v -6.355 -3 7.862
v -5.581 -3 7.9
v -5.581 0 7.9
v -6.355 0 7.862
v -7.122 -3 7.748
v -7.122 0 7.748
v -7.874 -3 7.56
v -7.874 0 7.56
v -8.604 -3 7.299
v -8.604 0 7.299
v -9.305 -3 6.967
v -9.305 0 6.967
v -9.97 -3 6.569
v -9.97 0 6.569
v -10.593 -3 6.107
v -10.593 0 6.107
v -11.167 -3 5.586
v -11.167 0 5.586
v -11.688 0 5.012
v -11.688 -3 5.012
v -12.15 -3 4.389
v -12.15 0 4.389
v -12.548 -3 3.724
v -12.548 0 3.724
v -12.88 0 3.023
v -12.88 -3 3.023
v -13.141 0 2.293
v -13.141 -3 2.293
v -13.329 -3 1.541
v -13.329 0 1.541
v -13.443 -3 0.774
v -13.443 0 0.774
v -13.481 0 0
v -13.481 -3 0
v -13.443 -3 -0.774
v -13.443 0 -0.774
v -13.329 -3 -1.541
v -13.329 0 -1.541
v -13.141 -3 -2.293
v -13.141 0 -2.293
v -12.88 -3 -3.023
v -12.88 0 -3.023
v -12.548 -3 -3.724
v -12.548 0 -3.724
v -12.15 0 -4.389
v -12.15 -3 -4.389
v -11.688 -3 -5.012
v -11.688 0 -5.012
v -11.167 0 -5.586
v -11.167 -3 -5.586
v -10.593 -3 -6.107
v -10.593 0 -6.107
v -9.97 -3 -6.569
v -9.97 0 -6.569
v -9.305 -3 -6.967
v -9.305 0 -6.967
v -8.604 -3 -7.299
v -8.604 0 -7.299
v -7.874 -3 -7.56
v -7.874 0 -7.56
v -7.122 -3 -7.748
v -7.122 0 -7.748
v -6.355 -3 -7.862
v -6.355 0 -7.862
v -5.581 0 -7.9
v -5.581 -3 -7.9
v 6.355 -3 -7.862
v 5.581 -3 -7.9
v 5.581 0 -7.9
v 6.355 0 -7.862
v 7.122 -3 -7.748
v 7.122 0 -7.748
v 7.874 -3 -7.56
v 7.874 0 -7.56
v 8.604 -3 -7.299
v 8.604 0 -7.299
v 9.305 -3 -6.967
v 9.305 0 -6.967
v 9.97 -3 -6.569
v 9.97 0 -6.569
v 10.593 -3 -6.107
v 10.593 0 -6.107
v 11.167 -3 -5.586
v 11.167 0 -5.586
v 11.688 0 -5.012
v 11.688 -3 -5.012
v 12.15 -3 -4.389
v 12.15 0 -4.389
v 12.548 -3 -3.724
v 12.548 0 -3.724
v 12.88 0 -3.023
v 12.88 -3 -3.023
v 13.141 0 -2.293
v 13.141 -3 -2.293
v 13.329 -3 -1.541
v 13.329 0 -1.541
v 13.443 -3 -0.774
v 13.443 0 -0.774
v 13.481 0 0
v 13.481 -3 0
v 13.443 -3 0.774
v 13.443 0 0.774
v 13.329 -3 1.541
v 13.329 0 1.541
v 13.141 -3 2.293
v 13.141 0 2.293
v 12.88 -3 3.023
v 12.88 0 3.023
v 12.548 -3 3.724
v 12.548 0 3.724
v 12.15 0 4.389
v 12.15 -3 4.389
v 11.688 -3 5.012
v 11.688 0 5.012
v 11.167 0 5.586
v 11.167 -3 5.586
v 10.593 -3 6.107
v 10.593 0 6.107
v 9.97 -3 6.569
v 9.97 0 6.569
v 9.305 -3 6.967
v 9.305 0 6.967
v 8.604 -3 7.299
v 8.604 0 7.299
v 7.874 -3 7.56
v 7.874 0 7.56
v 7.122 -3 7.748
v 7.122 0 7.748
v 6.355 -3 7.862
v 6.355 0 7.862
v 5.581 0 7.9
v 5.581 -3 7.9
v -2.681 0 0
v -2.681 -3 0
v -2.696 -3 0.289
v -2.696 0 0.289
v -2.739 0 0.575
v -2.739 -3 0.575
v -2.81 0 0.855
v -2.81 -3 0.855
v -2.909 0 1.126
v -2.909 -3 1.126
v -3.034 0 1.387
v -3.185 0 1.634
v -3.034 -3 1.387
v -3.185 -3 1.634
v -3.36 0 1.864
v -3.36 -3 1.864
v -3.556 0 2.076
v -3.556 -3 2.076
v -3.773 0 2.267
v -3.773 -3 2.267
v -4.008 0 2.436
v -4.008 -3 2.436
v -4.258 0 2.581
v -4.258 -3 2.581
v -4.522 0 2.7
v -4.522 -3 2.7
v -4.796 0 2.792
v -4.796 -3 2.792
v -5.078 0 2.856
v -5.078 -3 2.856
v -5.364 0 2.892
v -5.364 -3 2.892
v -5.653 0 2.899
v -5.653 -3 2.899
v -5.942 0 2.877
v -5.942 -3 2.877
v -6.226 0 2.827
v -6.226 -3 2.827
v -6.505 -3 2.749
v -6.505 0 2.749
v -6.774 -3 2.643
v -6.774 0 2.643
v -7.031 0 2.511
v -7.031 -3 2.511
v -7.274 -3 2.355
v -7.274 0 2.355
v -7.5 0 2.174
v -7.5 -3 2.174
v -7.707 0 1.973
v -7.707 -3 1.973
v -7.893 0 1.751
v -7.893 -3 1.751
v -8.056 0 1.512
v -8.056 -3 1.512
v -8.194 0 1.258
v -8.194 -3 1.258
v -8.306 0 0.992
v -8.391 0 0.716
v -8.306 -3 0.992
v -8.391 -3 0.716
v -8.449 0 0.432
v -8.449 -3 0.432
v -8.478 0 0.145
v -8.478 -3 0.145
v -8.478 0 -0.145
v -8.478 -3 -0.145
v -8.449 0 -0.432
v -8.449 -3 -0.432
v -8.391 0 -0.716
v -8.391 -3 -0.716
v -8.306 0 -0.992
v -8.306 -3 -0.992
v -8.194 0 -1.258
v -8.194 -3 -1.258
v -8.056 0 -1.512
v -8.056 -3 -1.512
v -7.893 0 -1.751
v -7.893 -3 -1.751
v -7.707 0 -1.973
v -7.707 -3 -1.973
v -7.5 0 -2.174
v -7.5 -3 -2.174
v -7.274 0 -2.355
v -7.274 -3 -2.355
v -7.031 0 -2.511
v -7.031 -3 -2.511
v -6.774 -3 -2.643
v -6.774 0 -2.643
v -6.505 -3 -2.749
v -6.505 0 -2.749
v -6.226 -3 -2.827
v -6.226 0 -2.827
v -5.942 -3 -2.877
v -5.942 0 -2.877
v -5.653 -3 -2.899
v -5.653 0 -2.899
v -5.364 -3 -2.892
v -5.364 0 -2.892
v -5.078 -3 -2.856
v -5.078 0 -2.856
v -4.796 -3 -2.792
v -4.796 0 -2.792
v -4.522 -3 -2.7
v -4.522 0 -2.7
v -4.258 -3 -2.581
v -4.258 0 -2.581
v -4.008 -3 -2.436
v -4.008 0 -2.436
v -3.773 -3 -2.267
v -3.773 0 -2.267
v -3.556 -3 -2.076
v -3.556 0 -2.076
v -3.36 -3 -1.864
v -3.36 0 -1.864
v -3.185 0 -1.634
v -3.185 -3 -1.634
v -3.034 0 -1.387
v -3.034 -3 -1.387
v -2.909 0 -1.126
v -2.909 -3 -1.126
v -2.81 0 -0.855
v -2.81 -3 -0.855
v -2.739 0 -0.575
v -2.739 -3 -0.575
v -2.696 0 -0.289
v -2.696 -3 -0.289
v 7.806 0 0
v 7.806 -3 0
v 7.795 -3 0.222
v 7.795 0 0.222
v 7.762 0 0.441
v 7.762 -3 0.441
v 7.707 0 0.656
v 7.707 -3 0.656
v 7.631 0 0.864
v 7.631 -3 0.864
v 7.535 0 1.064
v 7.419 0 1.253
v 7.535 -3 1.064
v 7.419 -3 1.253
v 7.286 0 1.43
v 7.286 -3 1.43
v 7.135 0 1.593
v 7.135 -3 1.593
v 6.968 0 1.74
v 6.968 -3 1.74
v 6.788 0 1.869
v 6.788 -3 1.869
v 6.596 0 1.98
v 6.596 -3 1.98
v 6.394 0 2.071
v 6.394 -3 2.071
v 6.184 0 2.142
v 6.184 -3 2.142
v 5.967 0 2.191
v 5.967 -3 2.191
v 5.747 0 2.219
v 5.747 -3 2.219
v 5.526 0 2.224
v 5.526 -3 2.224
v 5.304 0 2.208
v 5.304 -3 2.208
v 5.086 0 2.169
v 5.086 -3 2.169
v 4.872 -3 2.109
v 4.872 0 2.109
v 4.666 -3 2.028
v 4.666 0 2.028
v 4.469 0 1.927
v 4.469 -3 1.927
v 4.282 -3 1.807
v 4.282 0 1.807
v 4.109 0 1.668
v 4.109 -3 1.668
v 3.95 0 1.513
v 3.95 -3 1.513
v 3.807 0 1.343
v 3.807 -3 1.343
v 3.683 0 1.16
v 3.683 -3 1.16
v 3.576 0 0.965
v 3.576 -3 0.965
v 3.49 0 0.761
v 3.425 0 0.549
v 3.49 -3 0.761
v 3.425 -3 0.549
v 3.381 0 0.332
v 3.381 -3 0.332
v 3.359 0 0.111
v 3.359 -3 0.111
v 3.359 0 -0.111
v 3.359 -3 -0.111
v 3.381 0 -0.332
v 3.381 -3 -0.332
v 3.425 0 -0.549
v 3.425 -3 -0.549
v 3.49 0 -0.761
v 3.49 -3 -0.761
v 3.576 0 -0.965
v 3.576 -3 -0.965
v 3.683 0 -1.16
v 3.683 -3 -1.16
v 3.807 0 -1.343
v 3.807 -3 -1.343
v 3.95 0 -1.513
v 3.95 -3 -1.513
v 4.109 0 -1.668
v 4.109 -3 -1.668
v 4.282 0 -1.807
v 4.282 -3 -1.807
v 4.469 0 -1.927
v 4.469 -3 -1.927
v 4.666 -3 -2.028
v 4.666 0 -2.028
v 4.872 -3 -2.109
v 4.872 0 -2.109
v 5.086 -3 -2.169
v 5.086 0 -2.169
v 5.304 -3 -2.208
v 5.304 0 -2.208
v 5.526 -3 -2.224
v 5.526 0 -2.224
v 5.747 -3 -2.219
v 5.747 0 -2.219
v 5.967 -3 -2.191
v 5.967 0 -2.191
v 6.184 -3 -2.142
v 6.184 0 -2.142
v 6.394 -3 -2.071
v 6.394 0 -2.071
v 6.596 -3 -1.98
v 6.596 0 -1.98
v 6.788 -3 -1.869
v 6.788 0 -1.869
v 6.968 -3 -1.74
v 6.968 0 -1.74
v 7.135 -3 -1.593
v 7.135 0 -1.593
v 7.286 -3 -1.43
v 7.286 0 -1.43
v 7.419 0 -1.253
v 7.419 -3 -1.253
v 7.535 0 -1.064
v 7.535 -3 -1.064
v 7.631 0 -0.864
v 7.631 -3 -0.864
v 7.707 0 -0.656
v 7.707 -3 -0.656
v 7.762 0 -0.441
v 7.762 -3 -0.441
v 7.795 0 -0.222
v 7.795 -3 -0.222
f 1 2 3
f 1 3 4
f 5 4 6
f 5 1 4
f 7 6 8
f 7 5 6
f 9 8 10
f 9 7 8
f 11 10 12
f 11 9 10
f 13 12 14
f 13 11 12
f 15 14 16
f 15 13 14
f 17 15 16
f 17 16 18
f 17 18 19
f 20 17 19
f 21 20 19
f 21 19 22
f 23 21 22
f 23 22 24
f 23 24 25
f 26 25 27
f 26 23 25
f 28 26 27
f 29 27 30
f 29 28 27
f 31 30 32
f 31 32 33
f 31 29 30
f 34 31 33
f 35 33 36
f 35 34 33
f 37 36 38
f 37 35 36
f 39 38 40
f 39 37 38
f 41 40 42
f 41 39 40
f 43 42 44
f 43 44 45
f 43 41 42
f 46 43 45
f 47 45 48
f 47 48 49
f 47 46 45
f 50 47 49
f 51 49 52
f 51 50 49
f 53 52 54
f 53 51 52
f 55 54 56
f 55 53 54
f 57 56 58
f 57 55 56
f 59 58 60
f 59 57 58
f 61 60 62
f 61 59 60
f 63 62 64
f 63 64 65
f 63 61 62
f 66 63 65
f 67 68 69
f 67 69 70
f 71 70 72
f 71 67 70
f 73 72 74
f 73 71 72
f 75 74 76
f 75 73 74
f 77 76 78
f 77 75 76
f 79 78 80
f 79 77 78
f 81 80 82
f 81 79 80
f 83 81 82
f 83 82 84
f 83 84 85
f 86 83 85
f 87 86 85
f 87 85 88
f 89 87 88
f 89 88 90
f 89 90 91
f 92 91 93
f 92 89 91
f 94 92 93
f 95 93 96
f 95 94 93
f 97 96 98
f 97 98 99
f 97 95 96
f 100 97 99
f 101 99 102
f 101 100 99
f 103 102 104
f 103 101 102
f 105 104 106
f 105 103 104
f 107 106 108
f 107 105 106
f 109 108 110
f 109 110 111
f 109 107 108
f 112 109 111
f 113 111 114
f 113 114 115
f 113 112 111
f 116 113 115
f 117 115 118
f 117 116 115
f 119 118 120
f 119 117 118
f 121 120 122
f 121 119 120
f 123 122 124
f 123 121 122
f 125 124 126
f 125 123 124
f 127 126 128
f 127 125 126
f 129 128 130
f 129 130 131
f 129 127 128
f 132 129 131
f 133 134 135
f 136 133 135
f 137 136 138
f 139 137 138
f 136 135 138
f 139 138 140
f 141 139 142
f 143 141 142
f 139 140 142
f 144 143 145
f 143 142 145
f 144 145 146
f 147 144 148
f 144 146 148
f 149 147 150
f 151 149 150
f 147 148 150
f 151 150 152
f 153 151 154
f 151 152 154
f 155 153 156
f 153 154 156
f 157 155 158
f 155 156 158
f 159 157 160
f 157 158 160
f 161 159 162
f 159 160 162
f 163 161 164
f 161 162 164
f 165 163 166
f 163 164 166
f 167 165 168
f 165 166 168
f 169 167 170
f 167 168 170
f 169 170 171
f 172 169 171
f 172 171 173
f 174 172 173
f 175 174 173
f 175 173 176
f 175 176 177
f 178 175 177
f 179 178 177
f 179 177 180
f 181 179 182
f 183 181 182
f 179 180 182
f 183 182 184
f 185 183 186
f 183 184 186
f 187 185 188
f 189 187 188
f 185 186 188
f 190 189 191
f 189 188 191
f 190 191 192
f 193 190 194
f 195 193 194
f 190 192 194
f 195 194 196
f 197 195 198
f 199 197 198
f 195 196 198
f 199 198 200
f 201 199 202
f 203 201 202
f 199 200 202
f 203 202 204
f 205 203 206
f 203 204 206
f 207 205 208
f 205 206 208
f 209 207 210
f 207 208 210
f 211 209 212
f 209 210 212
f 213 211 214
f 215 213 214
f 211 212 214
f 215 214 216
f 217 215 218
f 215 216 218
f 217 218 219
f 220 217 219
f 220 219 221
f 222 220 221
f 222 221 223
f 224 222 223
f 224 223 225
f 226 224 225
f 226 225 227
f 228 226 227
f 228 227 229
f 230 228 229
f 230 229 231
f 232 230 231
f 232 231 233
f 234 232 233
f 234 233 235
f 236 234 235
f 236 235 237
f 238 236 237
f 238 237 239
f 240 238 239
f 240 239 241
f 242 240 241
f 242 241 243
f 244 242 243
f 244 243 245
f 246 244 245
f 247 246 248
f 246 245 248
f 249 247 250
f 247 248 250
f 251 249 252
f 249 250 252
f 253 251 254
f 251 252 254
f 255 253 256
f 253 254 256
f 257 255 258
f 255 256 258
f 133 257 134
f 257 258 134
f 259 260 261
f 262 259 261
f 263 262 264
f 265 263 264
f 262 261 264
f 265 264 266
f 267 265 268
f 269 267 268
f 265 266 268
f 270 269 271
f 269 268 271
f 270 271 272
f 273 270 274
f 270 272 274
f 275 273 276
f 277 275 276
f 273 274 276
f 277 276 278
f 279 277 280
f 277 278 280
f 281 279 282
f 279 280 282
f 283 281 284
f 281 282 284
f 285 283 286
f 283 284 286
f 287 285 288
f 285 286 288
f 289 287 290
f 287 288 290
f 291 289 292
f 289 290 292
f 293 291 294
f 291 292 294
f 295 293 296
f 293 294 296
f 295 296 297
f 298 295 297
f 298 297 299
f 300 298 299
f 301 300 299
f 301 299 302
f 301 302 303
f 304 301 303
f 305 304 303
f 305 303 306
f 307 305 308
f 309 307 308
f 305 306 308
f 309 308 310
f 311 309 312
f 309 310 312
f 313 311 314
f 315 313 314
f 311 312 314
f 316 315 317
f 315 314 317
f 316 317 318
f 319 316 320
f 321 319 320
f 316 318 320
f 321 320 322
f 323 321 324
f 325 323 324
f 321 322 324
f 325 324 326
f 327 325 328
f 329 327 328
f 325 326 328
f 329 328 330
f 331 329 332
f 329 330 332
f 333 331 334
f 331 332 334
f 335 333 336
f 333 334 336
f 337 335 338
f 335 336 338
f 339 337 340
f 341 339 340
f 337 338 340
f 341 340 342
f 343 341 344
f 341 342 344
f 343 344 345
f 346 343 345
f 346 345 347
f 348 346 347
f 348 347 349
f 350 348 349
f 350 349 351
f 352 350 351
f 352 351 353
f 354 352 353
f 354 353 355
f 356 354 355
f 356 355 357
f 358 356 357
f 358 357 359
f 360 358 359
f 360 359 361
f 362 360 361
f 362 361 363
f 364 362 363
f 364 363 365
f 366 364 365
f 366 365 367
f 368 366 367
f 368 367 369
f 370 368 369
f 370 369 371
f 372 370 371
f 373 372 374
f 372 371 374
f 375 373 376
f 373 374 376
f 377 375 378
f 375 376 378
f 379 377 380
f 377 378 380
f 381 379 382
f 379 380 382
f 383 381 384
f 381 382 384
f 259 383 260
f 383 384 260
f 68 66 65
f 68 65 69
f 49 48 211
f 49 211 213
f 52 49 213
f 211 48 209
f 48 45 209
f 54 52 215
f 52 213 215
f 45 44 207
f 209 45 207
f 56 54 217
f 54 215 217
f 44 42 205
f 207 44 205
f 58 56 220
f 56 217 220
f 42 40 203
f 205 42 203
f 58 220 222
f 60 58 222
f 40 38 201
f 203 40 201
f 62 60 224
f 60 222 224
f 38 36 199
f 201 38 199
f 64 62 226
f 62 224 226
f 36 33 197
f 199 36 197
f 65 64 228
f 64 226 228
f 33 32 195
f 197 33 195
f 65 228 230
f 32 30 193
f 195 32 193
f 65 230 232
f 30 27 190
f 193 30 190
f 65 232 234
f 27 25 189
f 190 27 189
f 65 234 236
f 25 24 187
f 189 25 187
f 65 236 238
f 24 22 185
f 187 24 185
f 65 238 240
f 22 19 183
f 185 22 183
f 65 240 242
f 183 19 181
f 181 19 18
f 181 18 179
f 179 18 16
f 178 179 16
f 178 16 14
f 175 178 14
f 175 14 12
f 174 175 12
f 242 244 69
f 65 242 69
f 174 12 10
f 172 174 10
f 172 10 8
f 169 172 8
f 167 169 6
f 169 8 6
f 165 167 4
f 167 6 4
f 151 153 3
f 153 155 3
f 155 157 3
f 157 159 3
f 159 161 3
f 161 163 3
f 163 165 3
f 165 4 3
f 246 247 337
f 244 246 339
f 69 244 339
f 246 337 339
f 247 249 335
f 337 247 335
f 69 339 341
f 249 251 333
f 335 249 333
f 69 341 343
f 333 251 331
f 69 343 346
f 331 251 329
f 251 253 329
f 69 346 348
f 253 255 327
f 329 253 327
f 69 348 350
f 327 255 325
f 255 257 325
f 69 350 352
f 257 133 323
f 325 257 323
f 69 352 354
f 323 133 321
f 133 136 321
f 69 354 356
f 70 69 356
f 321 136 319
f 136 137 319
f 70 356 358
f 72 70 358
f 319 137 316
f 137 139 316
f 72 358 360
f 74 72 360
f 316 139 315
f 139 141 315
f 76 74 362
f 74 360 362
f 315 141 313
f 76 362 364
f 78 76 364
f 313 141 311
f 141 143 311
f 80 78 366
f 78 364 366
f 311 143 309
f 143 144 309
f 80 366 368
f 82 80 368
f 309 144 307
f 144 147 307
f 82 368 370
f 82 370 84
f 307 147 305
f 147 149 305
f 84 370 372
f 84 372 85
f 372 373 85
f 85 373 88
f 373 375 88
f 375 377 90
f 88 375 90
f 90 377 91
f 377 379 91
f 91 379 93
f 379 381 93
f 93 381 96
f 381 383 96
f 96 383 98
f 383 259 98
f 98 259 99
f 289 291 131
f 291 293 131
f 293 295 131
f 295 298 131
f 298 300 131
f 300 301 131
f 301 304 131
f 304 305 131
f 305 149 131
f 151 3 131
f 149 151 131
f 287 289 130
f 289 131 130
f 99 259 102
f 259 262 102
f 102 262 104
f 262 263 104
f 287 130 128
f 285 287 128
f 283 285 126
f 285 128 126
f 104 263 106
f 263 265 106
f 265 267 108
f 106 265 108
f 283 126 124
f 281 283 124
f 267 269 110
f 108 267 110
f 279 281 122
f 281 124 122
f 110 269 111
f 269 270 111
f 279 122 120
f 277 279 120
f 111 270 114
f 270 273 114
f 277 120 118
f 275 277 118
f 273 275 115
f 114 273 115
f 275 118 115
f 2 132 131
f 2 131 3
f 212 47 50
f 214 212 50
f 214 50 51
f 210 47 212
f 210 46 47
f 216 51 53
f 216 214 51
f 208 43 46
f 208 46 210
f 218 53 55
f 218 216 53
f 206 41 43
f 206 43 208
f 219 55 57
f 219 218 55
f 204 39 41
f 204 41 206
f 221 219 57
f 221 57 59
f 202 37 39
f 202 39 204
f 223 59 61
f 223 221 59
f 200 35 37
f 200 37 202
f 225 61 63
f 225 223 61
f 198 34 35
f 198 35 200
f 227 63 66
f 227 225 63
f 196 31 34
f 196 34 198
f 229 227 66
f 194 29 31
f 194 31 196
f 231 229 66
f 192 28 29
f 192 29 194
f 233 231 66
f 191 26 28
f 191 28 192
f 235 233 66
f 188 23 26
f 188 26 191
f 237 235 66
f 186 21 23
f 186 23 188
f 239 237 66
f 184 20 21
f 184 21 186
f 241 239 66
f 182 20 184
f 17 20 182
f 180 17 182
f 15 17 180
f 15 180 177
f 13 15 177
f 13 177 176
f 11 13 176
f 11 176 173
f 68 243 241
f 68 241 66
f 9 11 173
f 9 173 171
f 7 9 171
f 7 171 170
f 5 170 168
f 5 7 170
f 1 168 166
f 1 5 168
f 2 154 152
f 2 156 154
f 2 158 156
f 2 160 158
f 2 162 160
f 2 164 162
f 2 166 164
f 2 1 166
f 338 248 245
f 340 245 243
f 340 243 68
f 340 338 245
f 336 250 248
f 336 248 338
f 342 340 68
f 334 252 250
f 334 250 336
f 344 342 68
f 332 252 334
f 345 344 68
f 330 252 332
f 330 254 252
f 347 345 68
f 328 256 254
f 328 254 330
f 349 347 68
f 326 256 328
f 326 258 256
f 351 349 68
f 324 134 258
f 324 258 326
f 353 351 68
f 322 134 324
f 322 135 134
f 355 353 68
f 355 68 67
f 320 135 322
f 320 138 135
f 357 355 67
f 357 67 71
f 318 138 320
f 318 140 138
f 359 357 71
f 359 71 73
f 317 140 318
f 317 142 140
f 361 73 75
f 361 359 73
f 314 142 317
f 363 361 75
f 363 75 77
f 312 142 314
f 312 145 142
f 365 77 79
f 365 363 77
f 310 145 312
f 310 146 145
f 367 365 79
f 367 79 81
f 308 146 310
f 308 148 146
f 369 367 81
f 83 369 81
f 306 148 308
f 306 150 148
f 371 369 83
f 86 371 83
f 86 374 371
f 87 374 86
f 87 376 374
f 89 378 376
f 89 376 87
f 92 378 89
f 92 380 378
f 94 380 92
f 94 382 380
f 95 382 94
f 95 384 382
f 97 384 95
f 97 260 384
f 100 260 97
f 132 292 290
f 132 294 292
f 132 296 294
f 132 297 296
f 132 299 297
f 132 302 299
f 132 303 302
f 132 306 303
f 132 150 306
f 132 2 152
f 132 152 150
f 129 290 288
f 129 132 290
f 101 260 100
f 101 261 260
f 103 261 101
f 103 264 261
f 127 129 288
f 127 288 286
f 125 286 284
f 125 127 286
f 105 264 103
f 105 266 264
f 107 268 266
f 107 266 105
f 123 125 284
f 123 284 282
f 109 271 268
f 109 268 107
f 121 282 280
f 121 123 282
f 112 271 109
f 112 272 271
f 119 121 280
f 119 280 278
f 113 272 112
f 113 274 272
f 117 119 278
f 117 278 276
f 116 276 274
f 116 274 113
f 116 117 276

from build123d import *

# Parameters (mm, degrees)
SKETCH1_R           = 2.9
SKETCH1_R_2         = 2.225
BOSS_EXTRUDE1_DEPTH = 3


with BuildPart() as part:
    # Sketch1 → Boss-Extrude1 (new body)
    with BuildSketch(Plane.XZ.offset(3)):
        with BuildLine():
            Line((5.581105, 7.9), (-5.581105, 7.9))
            ThreePointArc((-5.581105, 7.9), (-13.481105, 0), (-5.581105, -7.9))
            Line((-5.581105, -7.9), (5.581105, -7.9))
            ThreePointArc((5.581105, -7.9), (13.481105, 0), (5.581105, 7.9))
        make_face()
        with Locations((-5.581105, 0)):
            Circle(SKETCH1_R, mode=Mode.SUBTRACT)
        with Locations((5.581105, 0)):
            Circle(SKETCH1_R_2, mode=Mode.SUBTRACT)
    extrude(amount=-BOSS_EXTRUDE1_DEPTH)


solid = part.part
